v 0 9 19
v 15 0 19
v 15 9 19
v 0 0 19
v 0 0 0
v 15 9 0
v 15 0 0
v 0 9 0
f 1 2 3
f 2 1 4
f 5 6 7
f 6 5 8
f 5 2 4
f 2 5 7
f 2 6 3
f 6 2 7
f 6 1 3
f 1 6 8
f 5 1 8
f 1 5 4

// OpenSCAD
// Generated by SolidPython 1.0.1 on 2020-07-29 00:46:55


cube(size = [15, 9, 19]);
/***********************************************
*********      SolidPython code:      **********
************************************************
 
# import packages: SolidPython
from solid import *
from solid.utils import *
from itertools import chain, combinations, permutations


class Resize:

    def __init__(self, scad_file):
        self.scad_file = scad_file
        #self.scad_file = import_scad(scad_file)
        # cone/cylinder param:
        self.r1 = 0
        self.r2 = 0
        self.h = 0
        # rectangular prism param:
        self.w = 0
        self.l = 0
        # ellipse param:
        self.r = 0

    # import OpenScad code (file name corresponds to shape)


    # classify shape + parameters
    def assign(self, param1, param2, param3):
        if self.scad_file == 'cone.scad':
            self.r1 = param1
            self.r2 = param2
            self.h = param3
        elif self.scad_file == 'cylinder.scad':
            self.r1 = param1
            self.r2 = param2
            self.h = param3
        elif self.scad_file == 'rectangularPrism.scad':
            self.h = param1
            self.l = param2
            self.w = param3
        else:
            self.r = param1
            self.h = param2

    # resize parameters
    def iterate(self):
        x = range(3, 20, 2)
        i = 1
        if self.scad_file == 'cone.scad':
            tempList = list(permutations(x, 2))
            for temp in tempList:
                param1 = temp[0]
                param2 = temp[1]
                filepath = 'produced_scad_files/' + 'cone' + str(param1) + '_' + str(param2) + '_' + '.scad'
                scad_render_to_file(cylinder(h=param1, r1=param2, r2=0), filepath)

        elif self.scad_file == 'cylinder.scad':
            tempList = list(permutations(x, 3))
            for temp in tempList:
                param1 = temp[0]
                param2 = temp[1]
                filepath = 'produced_scad_files/' + 'cylinder' + str(param1) + '_' + str(param2) + '_' + '.scad'
                scad_render_to_file(cylinder(h=param1, r1=param2, r2=param2), filepath)

        elif self.scad_file == 'rectangularPrism.scad':
            tempList = list(permutations(x, 3))
            for temp in tempList:
                param1 = temp[0]
                param2 = temp[1]
                param3 = temp[2]
                filepath = 'produced_scad_files/' + 'rectangularPrism' + str(param1) + '_' + str(param2) + '_' + str(
                    param3) + '.scad'
                scad_render_to_file(cube(size=(param1, param2, param3)), filepath)

        elif self.scad_file == 'ellipse.scad':
            tempList = list(permutations(x, 4))
            for temp in tempList:
                param1 = temp[0]
                param2 = temp[1]
                param3 = temp[2]
                param4 = temp[3]
                filepath = 'produced_scad_files/' + 'ellipse' + str(param1) + '_' + str(param2) + '_' + str(param3) + '_' + str(param4) + '.scad'
                scad_render_to_file(scale([param1, param2, param3])(sphere(r=param4)), filepath)

    def render_to_scadfile(self):
        scad_render_to_file(scad, 'example.scad') 
 
************************************************/
